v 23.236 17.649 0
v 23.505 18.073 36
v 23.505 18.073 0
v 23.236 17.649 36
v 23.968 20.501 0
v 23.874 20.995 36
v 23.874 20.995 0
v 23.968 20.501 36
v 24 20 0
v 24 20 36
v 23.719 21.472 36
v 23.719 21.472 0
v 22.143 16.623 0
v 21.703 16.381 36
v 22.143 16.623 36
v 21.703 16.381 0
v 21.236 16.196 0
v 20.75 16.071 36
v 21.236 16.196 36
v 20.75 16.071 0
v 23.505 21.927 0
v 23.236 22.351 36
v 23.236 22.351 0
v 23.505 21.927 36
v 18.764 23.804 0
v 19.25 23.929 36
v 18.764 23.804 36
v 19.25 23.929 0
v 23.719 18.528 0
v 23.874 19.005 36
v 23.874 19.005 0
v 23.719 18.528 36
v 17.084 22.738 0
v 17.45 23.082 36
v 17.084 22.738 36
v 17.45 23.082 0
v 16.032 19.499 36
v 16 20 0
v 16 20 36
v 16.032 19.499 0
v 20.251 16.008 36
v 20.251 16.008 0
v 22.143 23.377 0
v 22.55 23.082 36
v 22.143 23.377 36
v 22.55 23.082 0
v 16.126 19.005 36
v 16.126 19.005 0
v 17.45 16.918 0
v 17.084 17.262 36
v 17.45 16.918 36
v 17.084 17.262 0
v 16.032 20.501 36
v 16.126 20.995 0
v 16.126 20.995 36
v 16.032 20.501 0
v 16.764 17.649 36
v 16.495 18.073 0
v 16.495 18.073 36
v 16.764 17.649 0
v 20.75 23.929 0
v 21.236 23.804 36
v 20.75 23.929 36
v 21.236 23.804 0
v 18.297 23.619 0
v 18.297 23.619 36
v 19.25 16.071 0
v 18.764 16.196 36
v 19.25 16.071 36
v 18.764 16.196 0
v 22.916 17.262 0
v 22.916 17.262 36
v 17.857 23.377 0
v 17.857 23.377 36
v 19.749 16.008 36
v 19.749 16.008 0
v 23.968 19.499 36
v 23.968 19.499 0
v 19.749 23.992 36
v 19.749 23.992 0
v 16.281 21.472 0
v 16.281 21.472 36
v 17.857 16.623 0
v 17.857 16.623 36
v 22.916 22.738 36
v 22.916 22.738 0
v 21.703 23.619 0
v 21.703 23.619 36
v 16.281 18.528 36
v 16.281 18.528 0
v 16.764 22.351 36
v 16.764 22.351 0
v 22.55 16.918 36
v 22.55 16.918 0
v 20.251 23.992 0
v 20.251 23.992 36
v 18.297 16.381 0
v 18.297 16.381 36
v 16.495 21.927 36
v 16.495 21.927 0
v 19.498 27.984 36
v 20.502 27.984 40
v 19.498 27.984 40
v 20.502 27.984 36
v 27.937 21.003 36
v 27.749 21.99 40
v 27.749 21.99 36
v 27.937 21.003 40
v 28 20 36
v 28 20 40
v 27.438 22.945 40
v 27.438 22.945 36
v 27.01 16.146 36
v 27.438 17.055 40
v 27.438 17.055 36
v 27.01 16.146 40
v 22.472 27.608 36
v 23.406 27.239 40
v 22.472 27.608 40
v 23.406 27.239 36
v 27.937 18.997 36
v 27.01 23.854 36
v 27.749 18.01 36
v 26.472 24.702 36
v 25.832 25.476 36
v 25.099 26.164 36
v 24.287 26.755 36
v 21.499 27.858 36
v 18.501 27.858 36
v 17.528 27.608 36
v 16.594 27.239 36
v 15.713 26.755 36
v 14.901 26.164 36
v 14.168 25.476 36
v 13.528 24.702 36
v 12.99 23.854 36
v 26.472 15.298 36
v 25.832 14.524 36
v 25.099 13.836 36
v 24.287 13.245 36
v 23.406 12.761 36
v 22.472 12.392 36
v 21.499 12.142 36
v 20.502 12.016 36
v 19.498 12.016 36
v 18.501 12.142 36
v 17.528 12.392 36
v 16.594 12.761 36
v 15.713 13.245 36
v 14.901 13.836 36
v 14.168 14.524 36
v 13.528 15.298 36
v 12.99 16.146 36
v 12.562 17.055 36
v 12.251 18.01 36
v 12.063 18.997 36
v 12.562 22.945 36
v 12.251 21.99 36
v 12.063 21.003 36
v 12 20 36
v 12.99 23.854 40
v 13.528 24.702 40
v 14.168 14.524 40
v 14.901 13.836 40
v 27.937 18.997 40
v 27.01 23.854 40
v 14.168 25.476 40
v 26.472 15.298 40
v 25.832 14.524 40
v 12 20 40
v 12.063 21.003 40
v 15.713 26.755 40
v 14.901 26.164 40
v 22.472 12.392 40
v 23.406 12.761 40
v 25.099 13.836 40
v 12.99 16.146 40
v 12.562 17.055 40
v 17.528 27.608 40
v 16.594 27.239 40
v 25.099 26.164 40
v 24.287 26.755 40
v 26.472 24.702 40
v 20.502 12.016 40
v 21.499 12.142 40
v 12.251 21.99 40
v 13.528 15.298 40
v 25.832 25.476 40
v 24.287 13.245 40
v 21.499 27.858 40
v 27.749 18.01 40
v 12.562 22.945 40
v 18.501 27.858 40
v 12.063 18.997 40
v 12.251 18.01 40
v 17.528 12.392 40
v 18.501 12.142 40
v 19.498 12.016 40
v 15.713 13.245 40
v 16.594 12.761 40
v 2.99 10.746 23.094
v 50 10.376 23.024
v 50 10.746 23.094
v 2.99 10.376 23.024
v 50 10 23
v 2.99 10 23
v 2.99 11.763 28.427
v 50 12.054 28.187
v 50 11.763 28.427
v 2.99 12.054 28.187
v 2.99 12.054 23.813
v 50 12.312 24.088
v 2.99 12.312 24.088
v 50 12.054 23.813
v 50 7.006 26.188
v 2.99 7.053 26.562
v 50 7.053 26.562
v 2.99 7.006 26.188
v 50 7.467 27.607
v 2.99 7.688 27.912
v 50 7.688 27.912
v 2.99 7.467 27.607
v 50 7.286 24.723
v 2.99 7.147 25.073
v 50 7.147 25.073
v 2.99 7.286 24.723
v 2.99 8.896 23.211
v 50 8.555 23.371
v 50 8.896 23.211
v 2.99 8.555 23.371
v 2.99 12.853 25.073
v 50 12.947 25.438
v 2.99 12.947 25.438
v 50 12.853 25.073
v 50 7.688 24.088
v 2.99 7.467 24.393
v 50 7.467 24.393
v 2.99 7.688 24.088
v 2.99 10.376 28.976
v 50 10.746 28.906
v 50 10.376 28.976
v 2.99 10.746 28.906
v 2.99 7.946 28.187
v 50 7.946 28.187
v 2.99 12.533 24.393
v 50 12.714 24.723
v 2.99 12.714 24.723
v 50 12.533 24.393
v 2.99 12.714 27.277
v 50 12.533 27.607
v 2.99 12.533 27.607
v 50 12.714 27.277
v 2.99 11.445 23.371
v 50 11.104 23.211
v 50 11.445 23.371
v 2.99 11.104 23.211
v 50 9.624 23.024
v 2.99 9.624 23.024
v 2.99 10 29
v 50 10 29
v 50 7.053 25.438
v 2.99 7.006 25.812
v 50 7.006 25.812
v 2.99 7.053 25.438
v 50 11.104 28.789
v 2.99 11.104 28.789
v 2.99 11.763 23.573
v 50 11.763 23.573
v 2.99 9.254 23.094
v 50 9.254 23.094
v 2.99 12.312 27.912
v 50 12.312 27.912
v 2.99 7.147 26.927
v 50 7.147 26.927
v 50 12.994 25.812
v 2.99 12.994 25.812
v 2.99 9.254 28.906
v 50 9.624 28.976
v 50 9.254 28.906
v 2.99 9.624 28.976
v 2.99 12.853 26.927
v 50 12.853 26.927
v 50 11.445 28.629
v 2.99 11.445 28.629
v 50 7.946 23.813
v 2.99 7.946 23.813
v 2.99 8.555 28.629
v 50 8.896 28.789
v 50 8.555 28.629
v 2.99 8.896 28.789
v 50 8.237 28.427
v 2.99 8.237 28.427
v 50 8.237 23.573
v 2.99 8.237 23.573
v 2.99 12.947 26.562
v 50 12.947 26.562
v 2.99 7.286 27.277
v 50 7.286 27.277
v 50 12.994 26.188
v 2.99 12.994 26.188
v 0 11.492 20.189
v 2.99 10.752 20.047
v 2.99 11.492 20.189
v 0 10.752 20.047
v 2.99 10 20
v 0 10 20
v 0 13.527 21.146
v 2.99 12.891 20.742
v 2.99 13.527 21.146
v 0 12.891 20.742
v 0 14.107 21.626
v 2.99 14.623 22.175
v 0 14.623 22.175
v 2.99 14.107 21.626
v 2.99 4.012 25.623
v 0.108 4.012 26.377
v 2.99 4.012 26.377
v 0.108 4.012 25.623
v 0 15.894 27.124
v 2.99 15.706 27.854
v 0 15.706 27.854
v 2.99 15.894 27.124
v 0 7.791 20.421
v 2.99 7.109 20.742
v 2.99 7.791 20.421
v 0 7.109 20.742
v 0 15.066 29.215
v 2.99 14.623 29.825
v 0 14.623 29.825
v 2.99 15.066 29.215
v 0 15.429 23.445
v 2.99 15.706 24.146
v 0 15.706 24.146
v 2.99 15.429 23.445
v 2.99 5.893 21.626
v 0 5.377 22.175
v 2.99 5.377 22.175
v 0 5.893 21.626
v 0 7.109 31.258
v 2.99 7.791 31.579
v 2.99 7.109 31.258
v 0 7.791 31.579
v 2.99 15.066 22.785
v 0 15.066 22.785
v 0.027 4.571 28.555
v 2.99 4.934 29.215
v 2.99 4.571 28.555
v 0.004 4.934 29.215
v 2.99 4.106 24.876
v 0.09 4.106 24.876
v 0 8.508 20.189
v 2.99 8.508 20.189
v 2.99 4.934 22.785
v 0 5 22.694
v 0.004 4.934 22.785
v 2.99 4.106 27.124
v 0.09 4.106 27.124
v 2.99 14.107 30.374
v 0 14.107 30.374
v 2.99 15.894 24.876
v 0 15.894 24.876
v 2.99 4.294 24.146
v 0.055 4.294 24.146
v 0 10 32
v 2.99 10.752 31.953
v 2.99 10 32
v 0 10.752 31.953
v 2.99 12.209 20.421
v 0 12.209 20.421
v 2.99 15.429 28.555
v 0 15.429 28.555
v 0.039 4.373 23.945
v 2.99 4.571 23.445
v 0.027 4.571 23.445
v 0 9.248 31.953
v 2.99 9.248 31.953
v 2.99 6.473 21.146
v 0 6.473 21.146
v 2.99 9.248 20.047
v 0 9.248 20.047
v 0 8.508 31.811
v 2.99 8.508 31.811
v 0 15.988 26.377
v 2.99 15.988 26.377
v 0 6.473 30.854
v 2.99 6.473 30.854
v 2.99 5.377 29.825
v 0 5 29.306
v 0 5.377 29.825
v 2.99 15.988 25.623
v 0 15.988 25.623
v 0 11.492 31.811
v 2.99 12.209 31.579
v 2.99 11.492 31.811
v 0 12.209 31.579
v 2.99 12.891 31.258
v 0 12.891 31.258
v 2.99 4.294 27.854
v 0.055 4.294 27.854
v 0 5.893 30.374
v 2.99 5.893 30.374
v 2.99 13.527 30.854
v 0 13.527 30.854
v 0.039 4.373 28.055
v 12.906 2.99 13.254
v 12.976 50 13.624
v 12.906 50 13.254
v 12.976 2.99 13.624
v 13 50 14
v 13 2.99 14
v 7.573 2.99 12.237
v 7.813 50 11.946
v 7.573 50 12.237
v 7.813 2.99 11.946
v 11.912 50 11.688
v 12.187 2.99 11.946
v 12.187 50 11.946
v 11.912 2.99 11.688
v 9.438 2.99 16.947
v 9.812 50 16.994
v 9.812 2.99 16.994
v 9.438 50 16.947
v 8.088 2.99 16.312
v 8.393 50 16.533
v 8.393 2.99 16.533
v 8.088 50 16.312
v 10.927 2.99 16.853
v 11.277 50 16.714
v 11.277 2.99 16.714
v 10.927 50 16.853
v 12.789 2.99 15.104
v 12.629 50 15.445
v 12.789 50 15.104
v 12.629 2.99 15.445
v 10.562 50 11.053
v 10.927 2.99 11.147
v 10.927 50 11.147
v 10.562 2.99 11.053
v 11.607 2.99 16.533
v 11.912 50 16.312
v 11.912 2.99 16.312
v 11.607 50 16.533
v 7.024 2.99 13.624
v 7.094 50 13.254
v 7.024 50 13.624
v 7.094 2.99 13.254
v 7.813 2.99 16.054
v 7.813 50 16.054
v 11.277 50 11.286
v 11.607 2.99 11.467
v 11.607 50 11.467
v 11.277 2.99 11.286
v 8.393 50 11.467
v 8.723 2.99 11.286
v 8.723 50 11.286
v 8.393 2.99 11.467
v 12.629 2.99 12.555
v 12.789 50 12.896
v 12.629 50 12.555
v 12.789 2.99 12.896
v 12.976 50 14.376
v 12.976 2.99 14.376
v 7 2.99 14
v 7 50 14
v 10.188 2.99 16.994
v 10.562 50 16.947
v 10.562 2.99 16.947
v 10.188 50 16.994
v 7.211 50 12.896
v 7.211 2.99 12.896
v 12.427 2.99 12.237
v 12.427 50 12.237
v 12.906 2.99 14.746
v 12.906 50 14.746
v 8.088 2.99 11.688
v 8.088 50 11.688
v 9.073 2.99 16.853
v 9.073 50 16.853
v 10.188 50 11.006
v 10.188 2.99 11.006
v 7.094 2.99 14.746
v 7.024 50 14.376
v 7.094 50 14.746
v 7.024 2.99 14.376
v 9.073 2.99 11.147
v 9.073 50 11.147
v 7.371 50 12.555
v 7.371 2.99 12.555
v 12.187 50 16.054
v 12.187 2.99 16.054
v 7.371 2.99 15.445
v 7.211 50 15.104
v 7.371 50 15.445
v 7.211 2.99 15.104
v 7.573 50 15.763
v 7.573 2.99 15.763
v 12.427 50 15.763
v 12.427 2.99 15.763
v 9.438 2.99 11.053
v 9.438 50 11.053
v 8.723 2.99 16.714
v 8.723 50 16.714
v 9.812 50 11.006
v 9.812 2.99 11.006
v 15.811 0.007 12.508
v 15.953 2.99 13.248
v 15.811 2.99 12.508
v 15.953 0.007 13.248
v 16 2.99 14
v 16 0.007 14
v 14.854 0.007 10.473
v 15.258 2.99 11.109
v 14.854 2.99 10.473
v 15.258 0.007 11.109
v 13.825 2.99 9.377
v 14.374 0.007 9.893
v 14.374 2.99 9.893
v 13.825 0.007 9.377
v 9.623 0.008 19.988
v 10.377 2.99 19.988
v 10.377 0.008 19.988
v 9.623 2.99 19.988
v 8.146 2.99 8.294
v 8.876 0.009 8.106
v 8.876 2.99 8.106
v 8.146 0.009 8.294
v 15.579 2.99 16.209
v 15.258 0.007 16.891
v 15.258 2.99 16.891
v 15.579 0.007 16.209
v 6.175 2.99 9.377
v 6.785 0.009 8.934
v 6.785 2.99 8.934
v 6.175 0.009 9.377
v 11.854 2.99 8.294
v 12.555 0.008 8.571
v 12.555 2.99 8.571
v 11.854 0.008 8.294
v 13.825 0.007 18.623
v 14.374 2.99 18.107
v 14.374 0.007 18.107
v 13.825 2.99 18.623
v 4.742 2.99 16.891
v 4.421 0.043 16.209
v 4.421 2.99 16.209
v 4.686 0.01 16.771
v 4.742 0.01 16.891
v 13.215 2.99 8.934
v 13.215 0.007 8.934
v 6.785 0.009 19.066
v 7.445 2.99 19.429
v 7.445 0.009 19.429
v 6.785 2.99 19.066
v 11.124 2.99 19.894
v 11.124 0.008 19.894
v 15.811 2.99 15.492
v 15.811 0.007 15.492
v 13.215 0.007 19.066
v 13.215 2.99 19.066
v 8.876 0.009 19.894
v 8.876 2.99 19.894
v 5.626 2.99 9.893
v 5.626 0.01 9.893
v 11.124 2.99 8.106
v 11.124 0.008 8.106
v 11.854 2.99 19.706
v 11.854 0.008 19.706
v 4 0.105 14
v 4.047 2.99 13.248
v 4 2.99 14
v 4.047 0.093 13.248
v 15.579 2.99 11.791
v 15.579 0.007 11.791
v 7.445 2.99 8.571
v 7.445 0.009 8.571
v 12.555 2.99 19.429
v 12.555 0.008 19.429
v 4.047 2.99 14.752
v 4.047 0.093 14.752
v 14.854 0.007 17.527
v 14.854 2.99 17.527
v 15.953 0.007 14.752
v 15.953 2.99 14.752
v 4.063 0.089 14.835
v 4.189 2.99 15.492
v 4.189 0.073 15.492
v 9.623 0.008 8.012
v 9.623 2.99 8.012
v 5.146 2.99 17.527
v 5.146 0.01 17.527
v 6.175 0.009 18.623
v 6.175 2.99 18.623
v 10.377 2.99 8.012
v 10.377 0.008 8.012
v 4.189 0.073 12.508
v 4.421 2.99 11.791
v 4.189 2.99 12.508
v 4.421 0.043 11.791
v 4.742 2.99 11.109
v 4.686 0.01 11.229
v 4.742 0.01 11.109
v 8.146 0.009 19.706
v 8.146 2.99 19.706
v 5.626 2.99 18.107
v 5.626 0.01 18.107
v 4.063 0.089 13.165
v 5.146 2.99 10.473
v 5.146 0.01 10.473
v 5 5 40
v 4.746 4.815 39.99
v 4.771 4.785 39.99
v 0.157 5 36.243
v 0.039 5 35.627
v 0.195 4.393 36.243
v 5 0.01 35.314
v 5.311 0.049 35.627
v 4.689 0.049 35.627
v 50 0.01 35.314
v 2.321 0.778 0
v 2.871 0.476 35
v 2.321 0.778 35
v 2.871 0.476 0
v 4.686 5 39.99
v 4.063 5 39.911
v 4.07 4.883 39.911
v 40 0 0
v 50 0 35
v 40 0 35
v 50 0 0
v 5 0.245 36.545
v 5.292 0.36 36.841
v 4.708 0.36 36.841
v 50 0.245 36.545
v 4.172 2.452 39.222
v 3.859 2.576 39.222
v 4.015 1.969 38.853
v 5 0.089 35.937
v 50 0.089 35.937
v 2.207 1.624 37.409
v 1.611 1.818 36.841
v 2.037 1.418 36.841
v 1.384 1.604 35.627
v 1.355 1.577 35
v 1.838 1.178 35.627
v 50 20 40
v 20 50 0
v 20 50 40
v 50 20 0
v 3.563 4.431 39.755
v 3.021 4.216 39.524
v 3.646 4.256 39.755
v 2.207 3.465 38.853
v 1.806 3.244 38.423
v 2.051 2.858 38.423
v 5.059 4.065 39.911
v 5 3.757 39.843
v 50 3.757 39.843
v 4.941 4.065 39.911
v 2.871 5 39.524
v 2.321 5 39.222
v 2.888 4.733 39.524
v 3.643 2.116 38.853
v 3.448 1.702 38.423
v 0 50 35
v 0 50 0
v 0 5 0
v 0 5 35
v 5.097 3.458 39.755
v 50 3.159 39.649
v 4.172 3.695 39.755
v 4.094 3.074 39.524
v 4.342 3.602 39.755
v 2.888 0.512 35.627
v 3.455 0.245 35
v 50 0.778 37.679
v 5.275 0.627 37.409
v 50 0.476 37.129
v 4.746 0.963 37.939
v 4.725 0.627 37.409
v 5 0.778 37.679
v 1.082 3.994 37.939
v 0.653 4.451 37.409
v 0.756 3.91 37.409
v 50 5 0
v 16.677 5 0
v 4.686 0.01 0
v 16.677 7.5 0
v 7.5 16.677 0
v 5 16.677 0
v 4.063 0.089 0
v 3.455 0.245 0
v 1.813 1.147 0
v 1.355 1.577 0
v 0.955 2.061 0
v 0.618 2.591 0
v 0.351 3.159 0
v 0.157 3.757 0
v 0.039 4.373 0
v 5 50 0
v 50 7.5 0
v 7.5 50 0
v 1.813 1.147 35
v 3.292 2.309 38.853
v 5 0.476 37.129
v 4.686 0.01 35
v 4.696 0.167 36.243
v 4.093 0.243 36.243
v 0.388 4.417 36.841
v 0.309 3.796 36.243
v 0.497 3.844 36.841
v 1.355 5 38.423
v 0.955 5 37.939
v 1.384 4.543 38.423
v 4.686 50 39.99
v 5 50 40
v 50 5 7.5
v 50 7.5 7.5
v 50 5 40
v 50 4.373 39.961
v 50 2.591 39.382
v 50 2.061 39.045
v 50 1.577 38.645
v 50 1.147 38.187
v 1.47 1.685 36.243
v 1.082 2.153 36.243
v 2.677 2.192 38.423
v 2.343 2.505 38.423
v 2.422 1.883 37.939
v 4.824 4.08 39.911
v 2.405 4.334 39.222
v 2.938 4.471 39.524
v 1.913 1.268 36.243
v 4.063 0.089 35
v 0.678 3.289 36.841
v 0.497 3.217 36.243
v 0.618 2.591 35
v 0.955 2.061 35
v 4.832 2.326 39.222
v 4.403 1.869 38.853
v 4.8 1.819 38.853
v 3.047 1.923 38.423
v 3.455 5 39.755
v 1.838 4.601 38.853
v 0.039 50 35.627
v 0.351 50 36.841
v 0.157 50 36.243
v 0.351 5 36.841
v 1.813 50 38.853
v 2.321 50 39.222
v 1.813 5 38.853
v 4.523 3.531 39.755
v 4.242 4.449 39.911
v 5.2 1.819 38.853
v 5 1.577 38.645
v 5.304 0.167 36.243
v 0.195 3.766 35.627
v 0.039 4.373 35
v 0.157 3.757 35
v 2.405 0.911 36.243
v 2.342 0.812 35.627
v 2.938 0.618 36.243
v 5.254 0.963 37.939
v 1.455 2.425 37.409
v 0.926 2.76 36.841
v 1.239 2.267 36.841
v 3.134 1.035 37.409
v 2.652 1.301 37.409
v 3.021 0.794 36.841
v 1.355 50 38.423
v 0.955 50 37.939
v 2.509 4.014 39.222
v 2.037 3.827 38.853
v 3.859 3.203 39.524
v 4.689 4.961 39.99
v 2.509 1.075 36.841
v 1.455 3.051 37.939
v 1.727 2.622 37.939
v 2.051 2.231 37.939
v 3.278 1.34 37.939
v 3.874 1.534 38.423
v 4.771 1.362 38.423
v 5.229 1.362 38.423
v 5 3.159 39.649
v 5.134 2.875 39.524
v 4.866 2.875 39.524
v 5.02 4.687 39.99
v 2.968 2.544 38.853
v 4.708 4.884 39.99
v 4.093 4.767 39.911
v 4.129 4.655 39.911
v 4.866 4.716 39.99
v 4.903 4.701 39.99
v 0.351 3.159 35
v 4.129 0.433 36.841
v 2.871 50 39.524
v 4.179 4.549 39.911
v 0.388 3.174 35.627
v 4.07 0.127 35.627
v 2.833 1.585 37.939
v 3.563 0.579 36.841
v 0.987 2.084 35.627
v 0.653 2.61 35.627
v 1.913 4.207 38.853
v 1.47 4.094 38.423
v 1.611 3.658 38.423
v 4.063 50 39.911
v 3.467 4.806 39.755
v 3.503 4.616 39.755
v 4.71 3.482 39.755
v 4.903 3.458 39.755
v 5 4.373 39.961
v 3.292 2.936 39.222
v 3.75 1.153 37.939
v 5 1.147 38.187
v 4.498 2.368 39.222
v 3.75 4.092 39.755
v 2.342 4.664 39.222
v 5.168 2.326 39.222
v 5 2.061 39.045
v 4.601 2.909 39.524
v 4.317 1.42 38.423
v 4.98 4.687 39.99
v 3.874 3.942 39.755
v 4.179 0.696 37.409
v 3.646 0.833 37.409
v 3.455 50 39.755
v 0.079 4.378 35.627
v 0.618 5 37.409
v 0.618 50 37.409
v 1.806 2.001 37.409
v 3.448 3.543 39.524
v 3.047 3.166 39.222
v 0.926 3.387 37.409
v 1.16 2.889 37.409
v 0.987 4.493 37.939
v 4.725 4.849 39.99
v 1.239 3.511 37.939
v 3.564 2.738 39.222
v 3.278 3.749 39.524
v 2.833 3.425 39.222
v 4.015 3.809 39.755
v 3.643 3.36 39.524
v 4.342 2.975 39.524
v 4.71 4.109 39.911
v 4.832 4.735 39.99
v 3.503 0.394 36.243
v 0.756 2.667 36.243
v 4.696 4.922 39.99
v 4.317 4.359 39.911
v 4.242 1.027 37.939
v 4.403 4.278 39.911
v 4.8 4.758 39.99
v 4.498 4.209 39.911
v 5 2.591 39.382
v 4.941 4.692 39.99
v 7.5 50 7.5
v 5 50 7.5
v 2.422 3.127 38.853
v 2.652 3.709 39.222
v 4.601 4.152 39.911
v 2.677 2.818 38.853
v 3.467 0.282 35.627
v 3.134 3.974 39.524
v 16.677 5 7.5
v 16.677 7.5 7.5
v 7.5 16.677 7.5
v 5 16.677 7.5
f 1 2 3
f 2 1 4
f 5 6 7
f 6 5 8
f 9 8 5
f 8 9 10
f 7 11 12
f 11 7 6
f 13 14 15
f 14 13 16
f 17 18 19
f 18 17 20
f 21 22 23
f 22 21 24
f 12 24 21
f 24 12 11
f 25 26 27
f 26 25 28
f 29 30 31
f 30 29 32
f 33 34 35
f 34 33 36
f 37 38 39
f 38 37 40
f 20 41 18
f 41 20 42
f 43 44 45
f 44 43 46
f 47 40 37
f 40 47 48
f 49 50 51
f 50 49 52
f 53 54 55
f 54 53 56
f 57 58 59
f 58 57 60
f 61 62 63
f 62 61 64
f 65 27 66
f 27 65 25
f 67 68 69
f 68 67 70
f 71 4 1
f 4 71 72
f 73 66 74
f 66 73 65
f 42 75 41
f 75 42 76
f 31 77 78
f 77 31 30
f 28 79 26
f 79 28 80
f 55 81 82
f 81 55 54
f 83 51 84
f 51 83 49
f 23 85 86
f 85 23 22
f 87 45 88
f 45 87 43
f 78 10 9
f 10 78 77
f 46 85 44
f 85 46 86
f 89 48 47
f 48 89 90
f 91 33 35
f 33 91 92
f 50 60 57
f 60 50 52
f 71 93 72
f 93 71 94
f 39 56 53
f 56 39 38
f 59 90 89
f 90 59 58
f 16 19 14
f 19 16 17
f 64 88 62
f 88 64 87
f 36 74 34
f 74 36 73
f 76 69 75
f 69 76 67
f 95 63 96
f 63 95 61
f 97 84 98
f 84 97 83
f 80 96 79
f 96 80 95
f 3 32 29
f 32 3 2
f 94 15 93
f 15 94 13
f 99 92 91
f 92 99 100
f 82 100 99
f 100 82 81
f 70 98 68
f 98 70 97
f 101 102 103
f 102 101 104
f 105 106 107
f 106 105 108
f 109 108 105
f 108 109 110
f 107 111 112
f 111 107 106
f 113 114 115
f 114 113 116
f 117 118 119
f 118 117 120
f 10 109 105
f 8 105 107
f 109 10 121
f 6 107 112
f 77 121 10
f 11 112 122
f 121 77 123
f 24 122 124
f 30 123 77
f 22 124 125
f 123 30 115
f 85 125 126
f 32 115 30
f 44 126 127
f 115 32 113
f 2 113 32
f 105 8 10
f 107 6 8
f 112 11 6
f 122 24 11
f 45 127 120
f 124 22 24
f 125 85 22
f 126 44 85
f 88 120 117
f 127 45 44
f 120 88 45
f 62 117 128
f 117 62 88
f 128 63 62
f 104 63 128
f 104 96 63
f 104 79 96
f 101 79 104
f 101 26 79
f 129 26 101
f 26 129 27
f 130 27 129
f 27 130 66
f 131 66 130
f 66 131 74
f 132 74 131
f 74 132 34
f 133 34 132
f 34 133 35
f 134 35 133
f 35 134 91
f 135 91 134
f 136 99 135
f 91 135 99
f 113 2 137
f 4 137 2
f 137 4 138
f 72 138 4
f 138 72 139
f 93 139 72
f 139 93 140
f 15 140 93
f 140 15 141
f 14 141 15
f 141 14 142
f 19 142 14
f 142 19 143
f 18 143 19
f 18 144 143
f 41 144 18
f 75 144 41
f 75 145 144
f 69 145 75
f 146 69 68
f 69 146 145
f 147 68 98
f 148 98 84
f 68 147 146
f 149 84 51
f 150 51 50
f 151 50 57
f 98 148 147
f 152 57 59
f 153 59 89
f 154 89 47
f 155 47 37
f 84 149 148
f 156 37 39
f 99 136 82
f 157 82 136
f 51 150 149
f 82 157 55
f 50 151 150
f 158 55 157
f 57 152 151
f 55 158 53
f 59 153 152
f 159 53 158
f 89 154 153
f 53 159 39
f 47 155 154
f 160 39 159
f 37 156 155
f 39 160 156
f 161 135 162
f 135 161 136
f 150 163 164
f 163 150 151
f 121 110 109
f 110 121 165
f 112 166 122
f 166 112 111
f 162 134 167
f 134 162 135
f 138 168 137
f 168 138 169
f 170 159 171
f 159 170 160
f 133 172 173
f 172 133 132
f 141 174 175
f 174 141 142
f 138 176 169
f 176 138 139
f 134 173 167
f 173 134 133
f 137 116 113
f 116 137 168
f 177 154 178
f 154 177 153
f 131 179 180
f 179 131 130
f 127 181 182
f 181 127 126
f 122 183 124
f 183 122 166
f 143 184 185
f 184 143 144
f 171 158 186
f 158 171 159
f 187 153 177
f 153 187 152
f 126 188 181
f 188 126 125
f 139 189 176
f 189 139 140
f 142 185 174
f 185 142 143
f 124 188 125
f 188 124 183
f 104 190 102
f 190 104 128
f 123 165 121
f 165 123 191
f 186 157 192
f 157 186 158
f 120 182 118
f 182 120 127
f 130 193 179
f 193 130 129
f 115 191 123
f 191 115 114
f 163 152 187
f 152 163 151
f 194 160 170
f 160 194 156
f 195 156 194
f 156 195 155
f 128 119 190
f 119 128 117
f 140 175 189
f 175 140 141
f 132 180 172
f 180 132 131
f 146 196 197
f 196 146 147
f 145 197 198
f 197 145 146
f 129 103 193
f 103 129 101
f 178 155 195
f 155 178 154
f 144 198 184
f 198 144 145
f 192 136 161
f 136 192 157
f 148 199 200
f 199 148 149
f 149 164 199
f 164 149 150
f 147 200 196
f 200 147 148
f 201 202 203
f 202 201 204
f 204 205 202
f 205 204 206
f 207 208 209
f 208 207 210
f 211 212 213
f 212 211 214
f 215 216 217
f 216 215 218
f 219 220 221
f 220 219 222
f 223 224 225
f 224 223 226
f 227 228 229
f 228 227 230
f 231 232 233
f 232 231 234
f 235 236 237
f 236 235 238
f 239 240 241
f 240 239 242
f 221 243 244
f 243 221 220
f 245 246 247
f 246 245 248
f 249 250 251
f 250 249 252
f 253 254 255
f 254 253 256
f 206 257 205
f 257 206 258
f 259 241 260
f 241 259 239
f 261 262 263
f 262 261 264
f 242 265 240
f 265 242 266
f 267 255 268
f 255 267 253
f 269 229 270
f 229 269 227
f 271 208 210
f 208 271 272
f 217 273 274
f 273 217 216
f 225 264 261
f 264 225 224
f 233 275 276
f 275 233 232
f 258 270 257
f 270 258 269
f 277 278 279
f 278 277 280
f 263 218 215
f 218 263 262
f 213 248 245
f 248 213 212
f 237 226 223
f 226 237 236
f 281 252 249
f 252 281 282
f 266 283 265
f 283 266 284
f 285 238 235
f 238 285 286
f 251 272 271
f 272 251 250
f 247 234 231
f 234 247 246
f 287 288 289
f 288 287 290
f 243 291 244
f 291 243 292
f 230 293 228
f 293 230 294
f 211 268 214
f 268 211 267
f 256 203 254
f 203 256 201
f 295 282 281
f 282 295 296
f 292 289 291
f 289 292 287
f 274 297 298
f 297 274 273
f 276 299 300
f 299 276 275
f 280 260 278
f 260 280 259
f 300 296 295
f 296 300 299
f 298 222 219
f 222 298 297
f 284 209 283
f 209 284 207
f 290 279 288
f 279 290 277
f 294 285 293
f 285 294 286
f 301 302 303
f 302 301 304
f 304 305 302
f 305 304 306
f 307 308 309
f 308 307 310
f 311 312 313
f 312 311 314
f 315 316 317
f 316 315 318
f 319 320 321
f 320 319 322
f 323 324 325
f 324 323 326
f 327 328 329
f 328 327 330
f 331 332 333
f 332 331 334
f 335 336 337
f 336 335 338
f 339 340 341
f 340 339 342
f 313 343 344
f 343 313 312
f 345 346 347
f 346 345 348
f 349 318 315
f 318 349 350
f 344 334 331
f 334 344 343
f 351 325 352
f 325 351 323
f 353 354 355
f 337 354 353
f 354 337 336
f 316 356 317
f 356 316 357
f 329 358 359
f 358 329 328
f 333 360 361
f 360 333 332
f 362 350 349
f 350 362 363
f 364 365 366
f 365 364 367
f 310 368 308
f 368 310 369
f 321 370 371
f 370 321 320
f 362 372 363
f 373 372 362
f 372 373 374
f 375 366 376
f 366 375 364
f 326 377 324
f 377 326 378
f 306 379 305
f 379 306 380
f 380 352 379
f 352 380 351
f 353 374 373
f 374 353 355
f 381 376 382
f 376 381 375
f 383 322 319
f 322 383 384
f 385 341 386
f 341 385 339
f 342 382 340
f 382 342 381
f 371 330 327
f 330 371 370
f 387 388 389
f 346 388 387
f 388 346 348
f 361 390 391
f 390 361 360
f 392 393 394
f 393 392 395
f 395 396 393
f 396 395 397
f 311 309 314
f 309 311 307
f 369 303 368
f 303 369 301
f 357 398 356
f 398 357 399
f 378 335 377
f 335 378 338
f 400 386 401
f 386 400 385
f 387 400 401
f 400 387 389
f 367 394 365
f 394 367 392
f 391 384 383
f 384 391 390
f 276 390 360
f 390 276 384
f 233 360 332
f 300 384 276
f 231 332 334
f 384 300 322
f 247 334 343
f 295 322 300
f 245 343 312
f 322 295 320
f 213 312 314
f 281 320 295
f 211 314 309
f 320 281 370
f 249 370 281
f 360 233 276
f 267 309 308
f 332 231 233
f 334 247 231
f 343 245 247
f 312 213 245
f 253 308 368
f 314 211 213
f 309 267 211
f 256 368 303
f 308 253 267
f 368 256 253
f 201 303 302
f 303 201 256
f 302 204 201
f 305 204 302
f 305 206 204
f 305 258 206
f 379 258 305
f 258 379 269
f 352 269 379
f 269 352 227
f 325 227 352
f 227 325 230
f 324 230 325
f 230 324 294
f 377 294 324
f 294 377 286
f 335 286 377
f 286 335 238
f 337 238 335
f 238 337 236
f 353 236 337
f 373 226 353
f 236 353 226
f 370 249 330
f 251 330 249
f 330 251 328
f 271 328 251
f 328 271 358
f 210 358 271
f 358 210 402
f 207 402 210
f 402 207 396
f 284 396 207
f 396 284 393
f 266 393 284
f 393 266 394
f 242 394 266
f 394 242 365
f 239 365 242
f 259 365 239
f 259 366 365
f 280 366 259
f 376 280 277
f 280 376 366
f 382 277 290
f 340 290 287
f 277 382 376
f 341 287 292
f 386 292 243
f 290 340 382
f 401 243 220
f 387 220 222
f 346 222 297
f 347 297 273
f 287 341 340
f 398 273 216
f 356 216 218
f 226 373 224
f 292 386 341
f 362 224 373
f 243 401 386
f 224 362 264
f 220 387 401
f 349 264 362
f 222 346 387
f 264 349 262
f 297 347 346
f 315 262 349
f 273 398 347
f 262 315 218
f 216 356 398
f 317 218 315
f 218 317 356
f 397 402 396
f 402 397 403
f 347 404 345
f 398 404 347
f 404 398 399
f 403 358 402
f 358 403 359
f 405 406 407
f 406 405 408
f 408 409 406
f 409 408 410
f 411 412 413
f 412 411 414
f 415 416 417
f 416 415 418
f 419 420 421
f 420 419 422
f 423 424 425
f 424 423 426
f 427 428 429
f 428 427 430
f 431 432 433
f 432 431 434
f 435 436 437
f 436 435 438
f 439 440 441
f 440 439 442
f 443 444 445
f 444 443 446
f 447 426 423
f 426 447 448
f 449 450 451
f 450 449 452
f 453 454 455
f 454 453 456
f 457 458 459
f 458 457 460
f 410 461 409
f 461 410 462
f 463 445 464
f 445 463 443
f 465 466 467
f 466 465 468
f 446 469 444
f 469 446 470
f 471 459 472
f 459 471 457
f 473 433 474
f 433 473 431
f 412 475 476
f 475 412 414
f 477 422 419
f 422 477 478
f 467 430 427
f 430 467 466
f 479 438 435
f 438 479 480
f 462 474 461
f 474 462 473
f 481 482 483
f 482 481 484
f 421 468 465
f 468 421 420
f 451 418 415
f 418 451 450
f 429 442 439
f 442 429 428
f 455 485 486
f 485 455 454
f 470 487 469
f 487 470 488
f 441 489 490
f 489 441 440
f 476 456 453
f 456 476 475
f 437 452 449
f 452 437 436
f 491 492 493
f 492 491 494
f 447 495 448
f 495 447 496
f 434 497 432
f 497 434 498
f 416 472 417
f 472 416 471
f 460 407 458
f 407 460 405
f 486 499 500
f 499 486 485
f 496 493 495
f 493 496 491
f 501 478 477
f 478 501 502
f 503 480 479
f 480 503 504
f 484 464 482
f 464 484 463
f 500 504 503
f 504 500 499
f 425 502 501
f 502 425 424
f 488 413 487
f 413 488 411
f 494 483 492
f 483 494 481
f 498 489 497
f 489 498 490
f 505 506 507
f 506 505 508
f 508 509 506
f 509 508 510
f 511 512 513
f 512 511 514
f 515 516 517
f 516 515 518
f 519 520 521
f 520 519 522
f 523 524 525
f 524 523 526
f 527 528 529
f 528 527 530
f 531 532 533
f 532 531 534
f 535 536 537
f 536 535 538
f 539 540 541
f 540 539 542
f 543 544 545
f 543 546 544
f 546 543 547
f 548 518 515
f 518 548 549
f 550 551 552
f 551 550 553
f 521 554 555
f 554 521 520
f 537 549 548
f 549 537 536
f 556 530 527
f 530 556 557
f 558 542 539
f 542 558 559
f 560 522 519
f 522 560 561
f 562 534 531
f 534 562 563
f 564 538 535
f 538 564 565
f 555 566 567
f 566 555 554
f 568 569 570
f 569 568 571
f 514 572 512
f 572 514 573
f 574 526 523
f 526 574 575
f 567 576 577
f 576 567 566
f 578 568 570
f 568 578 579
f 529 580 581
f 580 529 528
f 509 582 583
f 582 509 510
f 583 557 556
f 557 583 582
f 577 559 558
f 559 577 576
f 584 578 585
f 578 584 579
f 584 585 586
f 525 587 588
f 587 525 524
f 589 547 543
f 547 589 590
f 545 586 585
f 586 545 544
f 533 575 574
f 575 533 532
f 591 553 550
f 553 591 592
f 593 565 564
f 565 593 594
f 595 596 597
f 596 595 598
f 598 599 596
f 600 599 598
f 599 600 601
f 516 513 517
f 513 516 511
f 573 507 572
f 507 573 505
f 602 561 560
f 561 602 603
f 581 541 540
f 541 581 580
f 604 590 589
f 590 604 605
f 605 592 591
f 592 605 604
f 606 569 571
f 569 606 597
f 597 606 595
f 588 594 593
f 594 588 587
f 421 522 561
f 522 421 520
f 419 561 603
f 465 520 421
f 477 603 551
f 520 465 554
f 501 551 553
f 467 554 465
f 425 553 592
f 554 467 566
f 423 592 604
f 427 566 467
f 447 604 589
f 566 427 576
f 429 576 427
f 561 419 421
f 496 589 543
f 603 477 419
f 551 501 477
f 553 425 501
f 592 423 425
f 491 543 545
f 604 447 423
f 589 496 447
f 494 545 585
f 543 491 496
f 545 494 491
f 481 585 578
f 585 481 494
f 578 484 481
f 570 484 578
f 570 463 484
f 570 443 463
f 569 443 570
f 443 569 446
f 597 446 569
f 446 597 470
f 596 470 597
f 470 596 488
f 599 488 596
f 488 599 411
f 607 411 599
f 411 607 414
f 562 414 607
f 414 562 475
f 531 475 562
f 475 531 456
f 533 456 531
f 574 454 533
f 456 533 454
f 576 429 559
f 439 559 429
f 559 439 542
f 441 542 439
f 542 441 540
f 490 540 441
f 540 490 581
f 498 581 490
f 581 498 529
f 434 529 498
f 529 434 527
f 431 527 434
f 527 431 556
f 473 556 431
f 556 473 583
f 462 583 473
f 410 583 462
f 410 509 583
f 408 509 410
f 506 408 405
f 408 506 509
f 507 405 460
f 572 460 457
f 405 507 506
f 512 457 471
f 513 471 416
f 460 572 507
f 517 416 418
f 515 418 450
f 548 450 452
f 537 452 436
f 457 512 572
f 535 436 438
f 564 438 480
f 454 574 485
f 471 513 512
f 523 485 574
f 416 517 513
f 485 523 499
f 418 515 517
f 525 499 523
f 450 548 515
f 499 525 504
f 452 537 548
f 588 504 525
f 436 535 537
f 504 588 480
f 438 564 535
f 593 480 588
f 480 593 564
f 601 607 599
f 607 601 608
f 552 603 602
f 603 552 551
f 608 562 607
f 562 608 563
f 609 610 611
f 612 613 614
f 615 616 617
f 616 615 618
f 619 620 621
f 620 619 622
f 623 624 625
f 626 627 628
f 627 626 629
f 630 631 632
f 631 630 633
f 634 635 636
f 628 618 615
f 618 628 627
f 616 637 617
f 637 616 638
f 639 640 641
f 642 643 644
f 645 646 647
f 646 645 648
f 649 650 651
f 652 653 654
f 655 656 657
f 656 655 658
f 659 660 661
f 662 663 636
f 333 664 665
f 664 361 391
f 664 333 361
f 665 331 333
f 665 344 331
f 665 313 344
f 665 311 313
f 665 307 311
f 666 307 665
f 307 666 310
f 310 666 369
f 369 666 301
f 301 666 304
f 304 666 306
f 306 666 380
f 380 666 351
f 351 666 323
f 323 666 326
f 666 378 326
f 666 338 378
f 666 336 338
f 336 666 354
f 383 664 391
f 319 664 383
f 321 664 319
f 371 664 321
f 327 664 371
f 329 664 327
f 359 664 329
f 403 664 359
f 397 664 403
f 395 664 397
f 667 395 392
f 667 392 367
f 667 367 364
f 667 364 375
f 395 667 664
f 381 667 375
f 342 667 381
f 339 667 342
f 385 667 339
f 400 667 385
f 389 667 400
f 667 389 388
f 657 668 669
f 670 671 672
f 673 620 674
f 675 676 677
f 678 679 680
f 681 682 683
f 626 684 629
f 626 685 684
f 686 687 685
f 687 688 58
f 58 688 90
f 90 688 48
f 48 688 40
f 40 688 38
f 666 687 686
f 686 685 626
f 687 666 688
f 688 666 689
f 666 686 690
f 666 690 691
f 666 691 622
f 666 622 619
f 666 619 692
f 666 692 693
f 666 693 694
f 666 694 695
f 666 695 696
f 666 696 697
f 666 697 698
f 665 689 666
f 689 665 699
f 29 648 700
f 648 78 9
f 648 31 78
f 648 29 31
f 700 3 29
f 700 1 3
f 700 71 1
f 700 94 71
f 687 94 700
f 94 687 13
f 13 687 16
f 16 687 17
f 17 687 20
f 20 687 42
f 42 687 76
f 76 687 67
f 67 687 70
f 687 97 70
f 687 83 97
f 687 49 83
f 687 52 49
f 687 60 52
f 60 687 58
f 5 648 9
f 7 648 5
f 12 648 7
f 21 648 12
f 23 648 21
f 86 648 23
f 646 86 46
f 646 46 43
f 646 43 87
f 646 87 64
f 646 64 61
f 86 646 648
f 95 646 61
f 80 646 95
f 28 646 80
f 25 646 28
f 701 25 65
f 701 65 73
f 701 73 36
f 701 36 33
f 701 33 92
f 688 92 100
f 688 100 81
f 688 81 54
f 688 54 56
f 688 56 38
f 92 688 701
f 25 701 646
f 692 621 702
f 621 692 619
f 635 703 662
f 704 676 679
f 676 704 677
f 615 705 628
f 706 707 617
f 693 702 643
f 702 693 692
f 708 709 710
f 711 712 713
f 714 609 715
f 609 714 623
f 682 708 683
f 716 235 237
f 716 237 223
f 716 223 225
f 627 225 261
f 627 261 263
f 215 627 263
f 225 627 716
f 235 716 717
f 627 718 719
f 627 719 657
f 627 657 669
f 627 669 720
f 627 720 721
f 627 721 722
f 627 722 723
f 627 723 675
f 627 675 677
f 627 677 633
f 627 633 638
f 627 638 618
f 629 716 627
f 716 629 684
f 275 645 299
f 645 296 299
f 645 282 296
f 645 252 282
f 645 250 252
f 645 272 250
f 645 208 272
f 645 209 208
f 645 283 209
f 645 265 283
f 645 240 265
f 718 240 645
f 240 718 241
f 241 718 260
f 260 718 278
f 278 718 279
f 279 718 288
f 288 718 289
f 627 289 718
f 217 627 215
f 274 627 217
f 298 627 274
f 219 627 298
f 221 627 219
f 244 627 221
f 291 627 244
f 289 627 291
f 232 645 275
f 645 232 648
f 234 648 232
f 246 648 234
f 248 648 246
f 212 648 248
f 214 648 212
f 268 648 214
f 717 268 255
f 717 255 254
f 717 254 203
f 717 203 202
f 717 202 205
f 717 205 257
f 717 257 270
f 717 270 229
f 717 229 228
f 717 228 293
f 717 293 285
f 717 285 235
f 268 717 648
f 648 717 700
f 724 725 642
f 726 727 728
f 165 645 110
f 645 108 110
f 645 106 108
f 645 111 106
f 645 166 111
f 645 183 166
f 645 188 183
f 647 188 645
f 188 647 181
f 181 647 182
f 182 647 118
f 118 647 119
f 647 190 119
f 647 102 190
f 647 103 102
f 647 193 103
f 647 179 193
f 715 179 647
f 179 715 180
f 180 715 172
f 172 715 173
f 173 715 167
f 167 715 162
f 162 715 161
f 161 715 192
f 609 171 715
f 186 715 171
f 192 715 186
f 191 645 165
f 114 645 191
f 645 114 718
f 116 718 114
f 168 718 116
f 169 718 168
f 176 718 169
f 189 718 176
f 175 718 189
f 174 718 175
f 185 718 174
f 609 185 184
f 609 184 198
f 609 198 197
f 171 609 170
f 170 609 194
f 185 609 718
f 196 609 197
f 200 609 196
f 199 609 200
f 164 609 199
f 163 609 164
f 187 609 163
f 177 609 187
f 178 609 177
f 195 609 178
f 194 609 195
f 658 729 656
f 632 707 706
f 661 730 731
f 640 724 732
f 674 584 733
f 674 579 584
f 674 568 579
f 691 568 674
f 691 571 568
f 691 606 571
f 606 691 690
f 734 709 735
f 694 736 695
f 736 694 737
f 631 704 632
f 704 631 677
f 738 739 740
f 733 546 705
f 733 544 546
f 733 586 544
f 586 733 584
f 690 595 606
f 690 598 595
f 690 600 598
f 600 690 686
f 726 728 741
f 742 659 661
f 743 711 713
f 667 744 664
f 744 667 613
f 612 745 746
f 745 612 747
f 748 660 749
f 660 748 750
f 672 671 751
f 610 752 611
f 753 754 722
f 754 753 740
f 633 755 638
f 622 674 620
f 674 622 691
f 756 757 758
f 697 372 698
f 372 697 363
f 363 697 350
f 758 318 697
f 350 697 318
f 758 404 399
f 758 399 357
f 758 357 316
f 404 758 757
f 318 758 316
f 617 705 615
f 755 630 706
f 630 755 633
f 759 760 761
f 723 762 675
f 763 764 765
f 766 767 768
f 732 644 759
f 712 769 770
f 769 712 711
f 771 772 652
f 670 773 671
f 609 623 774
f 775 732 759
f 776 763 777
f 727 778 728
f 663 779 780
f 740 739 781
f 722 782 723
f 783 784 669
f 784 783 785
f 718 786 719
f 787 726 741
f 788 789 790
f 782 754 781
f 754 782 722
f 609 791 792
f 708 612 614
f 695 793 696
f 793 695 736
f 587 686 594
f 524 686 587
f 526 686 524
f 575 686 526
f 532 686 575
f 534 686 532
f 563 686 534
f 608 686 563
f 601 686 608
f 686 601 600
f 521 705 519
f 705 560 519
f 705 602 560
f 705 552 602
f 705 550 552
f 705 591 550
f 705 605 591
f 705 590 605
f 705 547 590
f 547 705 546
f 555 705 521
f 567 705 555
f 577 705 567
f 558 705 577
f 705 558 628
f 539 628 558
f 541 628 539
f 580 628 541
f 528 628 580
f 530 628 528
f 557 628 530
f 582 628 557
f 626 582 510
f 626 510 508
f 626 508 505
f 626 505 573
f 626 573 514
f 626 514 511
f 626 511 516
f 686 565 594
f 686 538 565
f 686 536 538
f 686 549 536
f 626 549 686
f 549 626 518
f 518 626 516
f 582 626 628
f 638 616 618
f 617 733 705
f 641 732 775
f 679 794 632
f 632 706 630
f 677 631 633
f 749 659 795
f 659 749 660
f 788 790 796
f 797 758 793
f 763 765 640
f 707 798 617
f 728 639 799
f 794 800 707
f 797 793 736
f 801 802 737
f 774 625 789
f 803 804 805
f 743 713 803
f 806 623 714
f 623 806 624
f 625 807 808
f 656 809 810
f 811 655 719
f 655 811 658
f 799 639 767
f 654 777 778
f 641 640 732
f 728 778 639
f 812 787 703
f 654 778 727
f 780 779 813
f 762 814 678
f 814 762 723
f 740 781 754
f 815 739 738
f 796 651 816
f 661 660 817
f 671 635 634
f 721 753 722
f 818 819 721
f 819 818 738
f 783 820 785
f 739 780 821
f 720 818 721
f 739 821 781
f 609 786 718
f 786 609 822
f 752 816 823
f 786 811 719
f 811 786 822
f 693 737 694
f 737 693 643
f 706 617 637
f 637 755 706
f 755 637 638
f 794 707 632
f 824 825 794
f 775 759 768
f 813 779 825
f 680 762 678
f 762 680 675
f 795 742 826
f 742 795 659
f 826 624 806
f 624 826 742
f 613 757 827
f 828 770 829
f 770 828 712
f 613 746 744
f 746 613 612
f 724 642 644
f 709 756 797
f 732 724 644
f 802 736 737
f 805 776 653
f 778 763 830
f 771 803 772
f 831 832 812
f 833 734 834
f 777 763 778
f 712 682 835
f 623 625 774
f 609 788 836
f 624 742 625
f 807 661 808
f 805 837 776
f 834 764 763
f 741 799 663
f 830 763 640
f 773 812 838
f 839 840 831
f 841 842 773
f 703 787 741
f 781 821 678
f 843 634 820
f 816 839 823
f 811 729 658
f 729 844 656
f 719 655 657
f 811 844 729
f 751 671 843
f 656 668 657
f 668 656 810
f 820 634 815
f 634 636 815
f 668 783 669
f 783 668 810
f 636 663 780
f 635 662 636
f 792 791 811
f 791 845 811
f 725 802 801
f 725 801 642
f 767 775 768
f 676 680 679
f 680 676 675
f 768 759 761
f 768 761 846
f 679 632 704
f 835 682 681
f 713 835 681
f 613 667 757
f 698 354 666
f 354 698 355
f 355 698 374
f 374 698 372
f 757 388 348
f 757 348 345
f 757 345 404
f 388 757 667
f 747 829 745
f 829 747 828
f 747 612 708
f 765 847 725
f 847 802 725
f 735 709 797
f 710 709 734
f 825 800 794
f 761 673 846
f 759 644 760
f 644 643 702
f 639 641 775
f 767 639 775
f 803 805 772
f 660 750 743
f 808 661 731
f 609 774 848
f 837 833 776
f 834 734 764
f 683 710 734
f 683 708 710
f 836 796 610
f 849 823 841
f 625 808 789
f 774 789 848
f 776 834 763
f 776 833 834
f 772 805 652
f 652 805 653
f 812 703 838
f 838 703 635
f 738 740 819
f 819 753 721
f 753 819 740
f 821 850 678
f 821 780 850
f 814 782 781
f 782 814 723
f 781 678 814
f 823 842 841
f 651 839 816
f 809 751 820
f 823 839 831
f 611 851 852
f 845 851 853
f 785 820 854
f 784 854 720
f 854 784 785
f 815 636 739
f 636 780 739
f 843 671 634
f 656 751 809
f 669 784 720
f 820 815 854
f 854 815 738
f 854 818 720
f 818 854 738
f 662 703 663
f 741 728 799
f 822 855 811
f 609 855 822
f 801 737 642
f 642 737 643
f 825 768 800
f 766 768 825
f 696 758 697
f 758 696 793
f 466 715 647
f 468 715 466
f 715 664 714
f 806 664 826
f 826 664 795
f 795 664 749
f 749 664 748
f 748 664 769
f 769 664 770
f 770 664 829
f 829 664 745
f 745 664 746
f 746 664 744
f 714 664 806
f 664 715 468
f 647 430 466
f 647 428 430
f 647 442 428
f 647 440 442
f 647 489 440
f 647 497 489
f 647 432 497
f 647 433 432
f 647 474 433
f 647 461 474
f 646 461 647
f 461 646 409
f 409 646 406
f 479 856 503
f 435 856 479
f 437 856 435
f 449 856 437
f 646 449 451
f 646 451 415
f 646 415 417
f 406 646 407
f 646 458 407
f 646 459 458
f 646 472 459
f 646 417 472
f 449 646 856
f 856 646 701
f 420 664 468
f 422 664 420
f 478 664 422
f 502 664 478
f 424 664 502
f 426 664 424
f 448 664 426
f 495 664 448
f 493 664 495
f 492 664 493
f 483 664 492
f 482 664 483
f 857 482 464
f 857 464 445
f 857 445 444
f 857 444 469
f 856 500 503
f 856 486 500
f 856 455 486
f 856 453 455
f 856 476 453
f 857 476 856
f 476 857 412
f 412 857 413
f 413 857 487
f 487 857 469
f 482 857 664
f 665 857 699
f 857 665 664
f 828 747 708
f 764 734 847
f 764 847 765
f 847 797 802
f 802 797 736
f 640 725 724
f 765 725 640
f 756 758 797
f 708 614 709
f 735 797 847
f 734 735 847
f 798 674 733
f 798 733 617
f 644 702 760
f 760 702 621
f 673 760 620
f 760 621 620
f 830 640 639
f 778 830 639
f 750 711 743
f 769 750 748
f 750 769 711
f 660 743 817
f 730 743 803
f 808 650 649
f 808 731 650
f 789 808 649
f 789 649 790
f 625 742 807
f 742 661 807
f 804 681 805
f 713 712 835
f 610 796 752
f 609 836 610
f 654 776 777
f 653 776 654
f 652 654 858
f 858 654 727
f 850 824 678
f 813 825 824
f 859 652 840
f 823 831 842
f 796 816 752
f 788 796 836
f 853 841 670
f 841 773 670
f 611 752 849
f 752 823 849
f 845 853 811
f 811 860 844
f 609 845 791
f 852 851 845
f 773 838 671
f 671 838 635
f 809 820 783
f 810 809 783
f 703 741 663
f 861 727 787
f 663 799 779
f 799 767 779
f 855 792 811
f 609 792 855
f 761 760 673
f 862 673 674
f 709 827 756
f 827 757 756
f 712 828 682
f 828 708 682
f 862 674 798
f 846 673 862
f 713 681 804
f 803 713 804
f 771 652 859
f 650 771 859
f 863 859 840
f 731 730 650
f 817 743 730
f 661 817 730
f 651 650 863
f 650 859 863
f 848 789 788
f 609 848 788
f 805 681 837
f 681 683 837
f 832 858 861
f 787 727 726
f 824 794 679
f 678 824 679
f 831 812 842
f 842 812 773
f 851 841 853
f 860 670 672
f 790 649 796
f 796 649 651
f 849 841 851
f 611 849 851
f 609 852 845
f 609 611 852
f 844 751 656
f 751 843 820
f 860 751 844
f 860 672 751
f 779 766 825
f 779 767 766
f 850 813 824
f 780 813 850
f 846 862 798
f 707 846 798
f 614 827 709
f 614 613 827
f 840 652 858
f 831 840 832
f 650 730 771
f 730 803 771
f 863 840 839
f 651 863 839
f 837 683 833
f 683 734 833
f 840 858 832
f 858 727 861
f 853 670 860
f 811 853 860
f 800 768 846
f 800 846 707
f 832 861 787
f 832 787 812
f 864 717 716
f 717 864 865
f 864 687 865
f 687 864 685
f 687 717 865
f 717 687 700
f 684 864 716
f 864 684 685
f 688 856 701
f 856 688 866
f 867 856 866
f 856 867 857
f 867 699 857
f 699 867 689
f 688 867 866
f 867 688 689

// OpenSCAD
// mod-case
// opening corner

devCornerDia=10;
devCornerHeight=40;
devCornerWidth=50;

verticalRodDia=8;
horizontalRodDia=6;

devPanelThickness=2.5;

$fn=50;
overlap=0.01;

openingCorner(devCornerDia,devCornerHeight,devCornerWidth,devPanelThickness,true);

/*
 * vertical slots are placed panelThickness*2 in from the outer edge
 * horizontal slots (on roundedCorner pieces) are placed panelThickness*2
 *    in from the top/bottom (outer) edge
 */
module openingCorner(cornerDia,cornerHeight,cornerWidth,panelThickness,roundedCorner) {
    slotDepth=panelThickness*3;
    difference() {
        hull() {
            if (roundedCorner) {
                translate([cornerDia/2,cornerDia/2,0])
                    cylinder(d=cornerDia, h=cornerHeight-cornerDia/2);
                translate([cornerDia/2,cornerDia/2,cornerHeight-cornerDia/2])
                    sphere(d=cornerDia);
                // top corner along y-axis
                translate([cornerDia/2,cornerWidth-cornerDia,0])
                    cube([cornerDia*1.5,cornerDia,cornerHeight]);
                translate([0,cornerWidth-cornerDia,0])
                    cube([cornerDia*1.5,cornerDia,cornerHeight-cornerDia/2]);
                translate([cornerDia/2,cornerDia/2,cornerHeight-cornerDia/2])
                    rotate([-90,0,0])
                    cylinder(d=cornerDia,h=cornerWidth-cornerDia/2);
                
                // top corner along x-axis
                translate([cornerWidth-cornerDia,cornerDia/2,0])
                    cube([cornerDia,cornerDia*1.5,cornerHeight]);
                translate([cornerWidth-cornerDia,0,0])
                    cube([cornerDia,cornerDia*1.5,cornerHeight-cornerDia/2]);
                translate([cornerDia/2,cornerDia/2,cornerHeight-cornerDia/2])
                    rotate([0,90,0])
                    cylinder(d=cornerDia,h=cornerWidth-cornerDia/2);
            } else {
                translate([cornerDia/2,cornerDia/2,0])
                    cylinder(d=cornerDia, h=cornerHeight);
                translate([0,cornerWidth-cornerDia,0])
                    cube([cornerDia*2,cornerDia,cornerHeight]);
                translate([cornerWidth-cornerDia,0,0])
                    cube([cornerDia,cornerDia*2,cornerHeight]);
            }
        }
        // vertical rod hole
        translate([verticalRodDia/2+cornerDia+horizontalRodDia,
                verticalRodDia/2+cornerDia+horizontalRodDia,0])
            countersunkHole(verticalRodDia,cornerHeight,true);
        // horizontal rod hole X
        translate([0,cornerDia,cornerHeight/2+horizontalRodDia])
            rotate([0,90,0])
                countersunkHole(horizontalRodDia, cornerWidth+cornerDia*1.5, false);
        // horizontal rod hole Y
        translate([cornerDia,0,cornerHeight/2-horizontalRodDia])
            rotate([-90,0,0])
                countersunkHole(horizontalRodDia, cornerWidth+cornerDia*1.5, false);
        
        // slot X
        translate([cornerWidth/3+overlap,panelThickness*2,-overlap])
            cube([cornerWidth*2/3,panelThickness,slotDepth+overlap]);
        
        // slot Y
        translate([panelThickness*2,cornerWidth/3+overlap,-overlap])
            cube([panelThickness,cornerWidth*2/3,slotDepth+overlap]);
    }

}

// note: this returns already overlapped and re-positioned
module countersunkHole(holeDia, holeLength, countersinkAtTop) {
    translate([0,0,-overlap])
        union() {
            cylinder(d=holeDia, h=holeLength+overlap*2);
            if (countersinkAtTop) {
                translate([0,0,holeLength-holeDia/2+overlap])
                    cylinder(d=holeDia*2, h=holeDia/2+overlap);
            } else {
                translate([0,0,-overlap])
                    cylinder(d=holeDia*2, h=holeDia/2+overlap);
            }
        }
}
